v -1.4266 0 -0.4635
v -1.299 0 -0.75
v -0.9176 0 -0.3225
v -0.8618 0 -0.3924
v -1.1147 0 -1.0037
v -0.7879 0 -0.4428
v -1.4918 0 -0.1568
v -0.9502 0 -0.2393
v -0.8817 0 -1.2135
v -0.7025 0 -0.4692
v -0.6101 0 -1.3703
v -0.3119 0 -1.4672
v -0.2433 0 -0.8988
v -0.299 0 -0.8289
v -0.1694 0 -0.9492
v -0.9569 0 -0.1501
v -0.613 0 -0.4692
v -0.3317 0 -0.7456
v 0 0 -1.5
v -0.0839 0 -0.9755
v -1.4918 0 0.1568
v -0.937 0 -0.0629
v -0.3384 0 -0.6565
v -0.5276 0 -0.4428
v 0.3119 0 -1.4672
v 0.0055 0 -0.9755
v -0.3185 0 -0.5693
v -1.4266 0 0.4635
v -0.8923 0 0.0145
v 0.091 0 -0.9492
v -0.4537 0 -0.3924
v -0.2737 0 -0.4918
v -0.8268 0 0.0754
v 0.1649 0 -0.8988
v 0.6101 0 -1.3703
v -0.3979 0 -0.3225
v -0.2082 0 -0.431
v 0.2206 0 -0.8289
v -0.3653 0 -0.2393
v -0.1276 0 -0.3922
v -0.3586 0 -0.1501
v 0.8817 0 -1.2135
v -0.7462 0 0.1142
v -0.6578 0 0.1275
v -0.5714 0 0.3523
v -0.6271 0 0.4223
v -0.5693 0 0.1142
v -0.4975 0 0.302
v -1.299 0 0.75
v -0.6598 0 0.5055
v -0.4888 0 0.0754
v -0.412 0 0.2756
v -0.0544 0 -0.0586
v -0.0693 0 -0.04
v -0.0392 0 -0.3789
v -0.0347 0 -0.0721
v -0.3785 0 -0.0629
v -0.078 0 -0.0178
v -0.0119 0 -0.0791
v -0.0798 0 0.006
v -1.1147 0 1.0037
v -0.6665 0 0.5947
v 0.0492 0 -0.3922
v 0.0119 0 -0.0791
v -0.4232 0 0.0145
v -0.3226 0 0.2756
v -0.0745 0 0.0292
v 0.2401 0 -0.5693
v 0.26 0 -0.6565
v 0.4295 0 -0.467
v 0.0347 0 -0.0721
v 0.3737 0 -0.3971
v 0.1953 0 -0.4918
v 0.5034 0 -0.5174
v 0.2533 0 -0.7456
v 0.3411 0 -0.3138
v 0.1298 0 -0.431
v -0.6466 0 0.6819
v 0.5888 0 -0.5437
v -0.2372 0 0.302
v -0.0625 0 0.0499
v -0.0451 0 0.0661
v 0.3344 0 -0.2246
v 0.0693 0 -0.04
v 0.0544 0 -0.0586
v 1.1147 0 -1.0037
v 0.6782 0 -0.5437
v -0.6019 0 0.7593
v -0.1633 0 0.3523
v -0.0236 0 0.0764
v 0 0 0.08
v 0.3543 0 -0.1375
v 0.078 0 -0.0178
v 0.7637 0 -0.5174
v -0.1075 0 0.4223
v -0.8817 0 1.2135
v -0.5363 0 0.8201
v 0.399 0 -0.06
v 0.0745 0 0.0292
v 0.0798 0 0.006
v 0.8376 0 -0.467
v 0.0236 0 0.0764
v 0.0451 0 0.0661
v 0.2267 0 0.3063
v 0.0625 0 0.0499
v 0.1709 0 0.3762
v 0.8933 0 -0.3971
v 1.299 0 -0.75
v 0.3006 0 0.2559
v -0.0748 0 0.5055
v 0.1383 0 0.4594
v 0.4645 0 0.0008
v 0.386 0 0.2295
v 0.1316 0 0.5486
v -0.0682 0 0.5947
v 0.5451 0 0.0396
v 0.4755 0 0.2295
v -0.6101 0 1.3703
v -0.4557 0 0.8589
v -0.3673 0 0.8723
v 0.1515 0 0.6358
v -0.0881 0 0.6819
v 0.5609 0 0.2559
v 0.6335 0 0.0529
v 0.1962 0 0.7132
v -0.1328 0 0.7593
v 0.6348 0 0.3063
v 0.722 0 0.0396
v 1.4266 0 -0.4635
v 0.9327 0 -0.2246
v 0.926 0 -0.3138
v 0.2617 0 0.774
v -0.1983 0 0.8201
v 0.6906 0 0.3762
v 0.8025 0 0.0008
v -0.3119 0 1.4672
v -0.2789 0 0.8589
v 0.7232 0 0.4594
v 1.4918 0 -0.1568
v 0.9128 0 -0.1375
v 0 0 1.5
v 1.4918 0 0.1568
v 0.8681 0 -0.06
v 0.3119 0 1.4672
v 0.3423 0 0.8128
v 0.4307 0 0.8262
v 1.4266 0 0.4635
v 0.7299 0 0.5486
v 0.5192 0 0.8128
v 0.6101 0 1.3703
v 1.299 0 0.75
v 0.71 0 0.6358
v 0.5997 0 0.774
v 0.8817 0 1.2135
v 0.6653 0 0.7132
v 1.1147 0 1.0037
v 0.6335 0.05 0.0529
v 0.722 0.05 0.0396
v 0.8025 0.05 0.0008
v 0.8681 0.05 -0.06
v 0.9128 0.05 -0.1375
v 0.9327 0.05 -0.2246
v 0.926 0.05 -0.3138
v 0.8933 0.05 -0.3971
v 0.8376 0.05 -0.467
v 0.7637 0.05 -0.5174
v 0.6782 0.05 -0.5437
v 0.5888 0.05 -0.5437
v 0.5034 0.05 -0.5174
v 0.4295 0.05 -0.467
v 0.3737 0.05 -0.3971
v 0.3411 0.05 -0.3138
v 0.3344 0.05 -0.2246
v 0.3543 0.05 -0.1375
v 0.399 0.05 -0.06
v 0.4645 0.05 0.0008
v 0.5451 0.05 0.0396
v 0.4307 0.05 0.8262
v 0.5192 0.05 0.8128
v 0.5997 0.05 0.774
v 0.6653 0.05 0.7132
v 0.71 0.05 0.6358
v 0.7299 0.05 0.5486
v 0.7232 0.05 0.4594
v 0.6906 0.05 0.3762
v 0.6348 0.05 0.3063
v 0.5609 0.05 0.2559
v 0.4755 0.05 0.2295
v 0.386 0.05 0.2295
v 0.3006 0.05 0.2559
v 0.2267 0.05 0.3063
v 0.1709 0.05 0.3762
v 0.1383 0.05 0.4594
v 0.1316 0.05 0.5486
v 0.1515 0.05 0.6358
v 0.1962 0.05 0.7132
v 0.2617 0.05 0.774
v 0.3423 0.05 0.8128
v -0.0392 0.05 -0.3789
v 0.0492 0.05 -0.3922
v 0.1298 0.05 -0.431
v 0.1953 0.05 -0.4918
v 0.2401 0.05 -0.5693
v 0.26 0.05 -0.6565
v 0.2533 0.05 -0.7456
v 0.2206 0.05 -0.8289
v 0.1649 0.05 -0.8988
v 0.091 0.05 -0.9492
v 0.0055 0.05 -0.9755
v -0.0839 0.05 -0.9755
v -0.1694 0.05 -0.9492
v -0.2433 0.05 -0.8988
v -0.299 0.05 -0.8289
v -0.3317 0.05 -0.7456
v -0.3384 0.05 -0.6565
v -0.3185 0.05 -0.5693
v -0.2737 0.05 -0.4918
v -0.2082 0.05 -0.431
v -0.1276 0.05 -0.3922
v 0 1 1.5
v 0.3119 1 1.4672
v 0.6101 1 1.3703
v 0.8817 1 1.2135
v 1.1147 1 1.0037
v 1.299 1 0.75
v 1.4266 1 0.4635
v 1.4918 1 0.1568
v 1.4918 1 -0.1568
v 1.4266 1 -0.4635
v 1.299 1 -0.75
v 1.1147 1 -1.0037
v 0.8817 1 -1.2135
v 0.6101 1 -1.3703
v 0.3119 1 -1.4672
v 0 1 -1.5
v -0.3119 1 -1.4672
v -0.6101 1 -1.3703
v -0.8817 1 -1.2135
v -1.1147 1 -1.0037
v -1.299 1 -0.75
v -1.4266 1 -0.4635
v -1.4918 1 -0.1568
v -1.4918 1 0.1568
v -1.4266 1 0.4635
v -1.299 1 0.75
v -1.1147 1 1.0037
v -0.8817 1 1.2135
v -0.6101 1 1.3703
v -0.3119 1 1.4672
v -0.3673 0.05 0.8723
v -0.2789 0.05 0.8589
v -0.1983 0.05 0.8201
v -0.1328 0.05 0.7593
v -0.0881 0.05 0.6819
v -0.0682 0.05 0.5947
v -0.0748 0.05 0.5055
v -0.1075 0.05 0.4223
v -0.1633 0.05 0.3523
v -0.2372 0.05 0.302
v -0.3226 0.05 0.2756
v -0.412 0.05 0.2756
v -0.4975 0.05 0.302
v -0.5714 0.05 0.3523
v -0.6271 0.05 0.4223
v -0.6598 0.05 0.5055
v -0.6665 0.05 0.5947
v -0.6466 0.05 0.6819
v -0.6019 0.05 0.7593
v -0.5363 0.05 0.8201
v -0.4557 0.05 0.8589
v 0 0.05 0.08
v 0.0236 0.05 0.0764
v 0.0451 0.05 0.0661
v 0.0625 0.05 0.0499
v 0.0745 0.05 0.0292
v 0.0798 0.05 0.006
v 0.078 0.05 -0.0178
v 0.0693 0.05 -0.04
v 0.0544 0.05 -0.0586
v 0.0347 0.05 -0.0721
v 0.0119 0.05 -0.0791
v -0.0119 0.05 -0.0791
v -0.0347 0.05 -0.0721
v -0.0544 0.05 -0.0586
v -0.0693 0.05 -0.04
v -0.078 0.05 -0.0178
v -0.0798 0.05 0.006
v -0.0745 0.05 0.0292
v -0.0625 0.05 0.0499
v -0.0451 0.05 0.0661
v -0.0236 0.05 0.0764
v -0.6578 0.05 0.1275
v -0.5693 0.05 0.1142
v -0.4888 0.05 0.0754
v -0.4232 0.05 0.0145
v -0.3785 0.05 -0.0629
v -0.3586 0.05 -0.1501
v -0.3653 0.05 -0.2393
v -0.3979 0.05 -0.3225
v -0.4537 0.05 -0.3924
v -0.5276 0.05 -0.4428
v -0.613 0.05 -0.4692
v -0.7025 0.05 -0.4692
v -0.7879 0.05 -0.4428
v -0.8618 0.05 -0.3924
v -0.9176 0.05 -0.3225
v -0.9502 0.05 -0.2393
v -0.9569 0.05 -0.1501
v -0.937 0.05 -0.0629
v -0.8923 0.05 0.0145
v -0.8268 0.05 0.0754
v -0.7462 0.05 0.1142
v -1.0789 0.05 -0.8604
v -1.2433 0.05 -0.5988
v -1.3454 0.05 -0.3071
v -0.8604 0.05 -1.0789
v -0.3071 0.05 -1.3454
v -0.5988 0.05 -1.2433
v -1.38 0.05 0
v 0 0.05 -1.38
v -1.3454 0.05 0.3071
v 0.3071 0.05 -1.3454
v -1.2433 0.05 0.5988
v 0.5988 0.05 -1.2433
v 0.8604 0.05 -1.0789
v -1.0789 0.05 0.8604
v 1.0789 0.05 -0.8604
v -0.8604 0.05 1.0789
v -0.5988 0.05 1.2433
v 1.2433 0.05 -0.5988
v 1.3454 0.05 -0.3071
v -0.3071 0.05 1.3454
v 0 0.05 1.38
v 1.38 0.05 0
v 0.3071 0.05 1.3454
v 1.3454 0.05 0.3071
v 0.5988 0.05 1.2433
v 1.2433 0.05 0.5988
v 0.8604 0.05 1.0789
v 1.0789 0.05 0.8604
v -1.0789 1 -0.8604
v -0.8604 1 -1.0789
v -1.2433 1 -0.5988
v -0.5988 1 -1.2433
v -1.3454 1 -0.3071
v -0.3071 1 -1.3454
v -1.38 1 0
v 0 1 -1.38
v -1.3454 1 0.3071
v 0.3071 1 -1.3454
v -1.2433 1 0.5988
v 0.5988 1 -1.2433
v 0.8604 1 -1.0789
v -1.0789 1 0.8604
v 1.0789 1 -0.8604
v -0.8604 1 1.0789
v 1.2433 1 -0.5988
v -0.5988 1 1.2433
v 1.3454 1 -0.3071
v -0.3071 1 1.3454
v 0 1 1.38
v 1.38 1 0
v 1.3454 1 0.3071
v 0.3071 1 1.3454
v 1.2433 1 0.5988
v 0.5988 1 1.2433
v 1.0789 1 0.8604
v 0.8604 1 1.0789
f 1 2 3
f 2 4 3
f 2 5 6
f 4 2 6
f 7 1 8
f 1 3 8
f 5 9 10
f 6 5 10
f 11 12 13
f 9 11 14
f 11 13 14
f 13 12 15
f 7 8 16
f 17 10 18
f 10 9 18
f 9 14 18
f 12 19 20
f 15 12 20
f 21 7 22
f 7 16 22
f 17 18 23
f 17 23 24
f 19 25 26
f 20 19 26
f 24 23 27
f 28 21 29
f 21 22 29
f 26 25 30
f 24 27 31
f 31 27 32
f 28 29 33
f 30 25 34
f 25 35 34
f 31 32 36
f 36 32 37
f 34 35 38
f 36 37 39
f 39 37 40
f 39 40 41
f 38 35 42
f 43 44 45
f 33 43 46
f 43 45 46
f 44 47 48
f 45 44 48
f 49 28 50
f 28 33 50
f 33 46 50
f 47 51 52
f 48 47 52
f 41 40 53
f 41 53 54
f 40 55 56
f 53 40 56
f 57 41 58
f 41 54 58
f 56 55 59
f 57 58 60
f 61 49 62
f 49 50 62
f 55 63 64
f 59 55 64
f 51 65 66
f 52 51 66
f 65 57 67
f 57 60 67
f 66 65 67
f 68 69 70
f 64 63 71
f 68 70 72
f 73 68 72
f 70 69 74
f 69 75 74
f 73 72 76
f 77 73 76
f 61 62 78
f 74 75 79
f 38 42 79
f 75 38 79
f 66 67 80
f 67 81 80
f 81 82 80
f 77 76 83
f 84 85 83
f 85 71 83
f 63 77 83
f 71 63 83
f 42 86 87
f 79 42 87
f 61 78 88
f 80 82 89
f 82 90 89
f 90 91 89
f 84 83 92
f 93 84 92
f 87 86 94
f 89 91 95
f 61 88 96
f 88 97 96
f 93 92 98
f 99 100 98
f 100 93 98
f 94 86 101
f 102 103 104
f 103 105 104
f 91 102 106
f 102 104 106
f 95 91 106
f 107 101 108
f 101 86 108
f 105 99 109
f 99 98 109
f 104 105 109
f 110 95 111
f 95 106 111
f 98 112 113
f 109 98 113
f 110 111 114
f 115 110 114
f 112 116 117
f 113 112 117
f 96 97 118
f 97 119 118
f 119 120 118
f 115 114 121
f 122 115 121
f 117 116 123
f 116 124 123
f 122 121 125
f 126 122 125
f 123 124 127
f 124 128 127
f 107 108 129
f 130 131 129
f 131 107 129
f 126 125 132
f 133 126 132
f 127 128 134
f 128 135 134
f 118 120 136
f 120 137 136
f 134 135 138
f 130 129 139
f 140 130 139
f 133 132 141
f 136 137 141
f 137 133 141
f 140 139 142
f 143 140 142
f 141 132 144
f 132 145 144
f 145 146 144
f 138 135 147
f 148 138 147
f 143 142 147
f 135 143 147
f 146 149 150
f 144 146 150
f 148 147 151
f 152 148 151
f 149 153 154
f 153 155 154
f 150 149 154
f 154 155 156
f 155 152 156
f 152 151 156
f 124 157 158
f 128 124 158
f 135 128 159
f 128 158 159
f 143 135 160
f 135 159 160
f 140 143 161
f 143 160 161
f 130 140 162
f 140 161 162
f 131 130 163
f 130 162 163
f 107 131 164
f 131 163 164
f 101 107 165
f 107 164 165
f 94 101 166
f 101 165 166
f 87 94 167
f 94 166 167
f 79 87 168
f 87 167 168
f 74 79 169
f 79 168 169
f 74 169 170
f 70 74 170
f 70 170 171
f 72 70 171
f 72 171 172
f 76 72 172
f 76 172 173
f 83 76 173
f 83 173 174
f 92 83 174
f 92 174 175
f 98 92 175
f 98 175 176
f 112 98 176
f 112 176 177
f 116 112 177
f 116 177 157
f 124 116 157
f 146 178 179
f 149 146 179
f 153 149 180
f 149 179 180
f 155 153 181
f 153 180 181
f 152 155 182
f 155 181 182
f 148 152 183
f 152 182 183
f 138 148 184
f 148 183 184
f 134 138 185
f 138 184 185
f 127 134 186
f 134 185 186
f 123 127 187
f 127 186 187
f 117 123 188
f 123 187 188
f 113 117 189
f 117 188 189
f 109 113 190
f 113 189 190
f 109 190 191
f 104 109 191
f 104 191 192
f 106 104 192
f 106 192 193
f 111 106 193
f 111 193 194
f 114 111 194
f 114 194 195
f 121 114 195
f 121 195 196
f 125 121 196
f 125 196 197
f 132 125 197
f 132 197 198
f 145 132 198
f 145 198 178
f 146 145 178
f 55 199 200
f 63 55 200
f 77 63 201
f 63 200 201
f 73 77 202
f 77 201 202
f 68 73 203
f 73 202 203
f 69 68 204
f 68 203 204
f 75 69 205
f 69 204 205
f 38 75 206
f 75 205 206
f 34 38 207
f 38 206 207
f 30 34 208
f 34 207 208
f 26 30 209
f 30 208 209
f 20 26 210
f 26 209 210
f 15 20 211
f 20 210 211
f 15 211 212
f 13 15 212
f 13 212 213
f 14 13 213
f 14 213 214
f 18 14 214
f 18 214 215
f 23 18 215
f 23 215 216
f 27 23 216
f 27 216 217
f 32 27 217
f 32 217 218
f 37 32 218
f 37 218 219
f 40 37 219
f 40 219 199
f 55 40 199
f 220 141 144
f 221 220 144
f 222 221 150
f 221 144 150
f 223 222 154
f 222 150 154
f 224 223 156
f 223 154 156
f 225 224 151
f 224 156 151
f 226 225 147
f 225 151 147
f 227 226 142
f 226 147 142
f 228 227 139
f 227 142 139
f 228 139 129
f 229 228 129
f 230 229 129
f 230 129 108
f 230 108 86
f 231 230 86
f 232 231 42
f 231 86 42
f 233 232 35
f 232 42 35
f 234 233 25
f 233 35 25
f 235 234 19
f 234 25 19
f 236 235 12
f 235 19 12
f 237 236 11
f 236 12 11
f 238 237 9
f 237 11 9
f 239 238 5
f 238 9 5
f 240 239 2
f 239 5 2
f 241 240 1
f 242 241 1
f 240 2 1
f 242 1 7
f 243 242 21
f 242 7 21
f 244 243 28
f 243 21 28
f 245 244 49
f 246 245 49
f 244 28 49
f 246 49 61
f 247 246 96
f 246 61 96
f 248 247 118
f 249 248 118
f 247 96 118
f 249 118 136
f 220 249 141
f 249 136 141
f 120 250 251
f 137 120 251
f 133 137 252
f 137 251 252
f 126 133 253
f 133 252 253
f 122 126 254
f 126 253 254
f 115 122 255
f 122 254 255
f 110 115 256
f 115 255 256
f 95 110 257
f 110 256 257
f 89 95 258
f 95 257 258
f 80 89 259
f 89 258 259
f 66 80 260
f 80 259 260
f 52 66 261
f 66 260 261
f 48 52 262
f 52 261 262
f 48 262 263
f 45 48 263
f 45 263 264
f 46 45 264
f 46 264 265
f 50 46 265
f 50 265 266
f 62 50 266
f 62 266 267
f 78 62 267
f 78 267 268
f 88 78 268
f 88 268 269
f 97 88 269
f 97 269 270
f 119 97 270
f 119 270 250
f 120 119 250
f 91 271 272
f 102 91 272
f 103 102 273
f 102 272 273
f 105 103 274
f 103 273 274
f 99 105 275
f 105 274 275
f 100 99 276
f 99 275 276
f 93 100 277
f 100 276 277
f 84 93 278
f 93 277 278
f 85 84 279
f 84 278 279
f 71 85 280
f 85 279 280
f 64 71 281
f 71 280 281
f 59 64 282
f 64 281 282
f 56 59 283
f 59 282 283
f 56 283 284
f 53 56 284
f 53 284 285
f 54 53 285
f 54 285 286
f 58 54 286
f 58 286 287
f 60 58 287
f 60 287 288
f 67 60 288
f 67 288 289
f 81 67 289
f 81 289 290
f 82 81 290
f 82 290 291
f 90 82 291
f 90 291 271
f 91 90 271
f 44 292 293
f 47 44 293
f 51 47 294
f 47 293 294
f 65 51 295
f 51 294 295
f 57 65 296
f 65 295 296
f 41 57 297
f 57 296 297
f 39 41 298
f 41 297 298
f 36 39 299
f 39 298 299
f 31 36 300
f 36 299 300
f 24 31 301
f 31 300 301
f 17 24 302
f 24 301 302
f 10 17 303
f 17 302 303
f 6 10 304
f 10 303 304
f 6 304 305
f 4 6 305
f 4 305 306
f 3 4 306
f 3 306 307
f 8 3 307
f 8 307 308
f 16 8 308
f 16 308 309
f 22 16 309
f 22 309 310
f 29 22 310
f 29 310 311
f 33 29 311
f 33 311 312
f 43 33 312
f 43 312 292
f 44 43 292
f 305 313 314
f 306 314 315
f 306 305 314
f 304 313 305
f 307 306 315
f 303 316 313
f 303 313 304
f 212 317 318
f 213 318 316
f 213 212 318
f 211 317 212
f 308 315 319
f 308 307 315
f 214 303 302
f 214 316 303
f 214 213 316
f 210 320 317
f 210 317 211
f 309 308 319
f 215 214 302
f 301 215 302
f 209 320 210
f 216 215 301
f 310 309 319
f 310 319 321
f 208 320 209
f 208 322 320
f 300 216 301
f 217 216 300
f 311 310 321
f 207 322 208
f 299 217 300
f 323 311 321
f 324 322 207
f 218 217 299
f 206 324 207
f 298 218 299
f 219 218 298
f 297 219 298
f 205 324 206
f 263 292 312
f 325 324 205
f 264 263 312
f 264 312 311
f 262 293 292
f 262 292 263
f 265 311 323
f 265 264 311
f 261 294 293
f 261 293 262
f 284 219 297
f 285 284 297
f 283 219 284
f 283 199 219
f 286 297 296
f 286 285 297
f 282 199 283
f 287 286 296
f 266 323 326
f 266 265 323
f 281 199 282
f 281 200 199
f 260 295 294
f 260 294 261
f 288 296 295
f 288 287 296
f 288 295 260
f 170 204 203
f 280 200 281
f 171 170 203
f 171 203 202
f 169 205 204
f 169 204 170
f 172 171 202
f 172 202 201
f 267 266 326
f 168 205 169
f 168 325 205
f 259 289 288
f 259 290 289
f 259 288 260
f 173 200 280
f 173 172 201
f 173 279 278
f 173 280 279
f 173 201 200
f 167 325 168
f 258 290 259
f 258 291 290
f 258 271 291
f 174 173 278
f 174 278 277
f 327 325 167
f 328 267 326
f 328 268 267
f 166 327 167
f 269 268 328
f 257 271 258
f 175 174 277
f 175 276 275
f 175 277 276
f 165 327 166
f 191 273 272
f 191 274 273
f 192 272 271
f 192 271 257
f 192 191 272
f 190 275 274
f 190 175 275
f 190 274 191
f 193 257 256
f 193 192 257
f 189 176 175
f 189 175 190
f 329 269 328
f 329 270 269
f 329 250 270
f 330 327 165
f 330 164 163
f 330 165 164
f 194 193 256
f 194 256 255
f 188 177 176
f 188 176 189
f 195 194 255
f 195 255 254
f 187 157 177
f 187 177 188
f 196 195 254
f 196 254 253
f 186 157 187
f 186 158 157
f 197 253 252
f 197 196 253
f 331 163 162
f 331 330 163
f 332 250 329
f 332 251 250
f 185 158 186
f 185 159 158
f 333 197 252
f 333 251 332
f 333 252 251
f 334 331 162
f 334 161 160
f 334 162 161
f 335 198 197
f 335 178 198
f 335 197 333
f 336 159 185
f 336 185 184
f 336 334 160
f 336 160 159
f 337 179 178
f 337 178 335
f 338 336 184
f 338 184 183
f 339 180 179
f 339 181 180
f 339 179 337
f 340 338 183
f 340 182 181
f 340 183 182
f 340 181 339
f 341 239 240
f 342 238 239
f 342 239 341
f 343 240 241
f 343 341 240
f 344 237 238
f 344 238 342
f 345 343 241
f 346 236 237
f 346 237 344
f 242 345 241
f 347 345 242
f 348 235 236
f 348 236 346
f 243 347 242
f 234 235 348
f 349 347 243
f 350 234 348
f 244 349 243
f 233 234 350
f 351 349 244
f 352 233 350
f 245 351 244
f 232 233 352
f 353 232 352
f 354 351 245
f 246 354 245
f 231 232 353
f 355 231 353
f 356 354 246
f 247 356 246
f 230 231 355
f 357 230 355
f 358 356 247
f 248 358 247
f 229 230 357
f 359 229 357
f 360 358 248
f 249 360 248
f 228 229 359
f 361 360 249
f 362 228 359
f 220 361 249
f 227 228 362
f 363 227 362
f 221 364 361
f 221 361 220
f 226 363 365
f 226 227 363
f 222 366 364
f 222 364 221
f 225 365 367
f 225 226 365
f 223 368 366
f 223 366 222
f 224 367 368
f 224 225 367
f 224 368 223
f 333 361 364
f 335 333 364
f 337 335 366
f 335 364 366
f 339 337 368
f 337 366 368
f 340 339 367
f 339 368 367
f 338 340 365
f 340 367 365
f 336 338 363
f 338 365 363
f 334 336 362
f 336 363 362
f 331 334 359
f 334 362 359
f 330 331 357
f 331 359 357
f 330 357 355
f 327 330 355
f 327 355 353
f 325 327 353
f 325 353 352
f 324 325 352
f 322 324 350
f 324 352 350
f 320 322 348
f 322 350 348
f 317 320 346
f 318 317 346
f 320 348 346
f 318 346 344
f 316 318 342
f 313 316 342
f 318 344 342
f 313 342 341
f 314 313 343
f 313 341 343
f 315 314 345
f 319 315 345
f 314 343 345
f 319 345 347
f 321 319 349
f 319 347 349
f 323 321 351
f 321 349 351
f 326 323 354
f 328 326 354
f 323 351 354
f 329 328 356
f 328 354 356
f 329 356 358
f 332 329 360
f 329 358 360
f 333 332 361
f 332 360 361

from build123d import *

# Parameters (mm, degrees)
SKETCH1_R           = 150
BOSS_EXTRUDE1_DEPTH = 100
SKETCH3_R           = 138
CUT_EXTRUDE1_DEPTH  = 95
SKETCH4_R           = 30
CUT_EXTRUDE2_DEPTH  = 8
SKETCH5_R           = 8
CUT_EXTRUDE3_DEPTH  = 8
SCALE1_SCALE        = 0.01


with BuildPart() as part:
    # Sketch1 → Boss-Extrude1 (new body)
    with BuildSketch(Plane(origin=(0, 0, 0), x_dir=(1, 0, 0), z_dir=(0, 1, 0))):
        with Locations(Location((0, 0, 0), (0, 0, 270))):
            Circle(SKETCH1_R)
    extrude(amount=BOSS_EXTRUDE1_DEPTH)

    # Sketch3 → Cut-Extrude1 (cut)
    with BuildSketch(Plane(origin=(0, 100, 0), x_dir=(1, 0, 0), z_dir=(0, 1, 0))):
        with Locations(Location((0, 0, 0), (0, 0, 270))):
            Circle(SKETCH3_R)
    extrude(amount=-CUT_EXTRUDE1_DEPTH, mode=Mode.SUBTRACT)

    # Sketch4 → Cut-Extrude2 (cut)
    with BuildSketch(Plane(origin=(0, 5, 0), x_dir=(1, 0, 0), z_dir=(0, 1, 0))):
        with Locations(Location((-3.91997957, 67.886918918, 0), (0, 0, 270))):
            Circle(SKETCH4_R)
        with Locations(Location((63.352956303, 24.706333755, 0), (0, 0, 270))):
            Circle(SKETCH4_R)
        with Locations(Location((43.074259853, -52.61756492, 0), (0, 0, 270))):
            Circle(SKETCH4_R)
        with Locations(Location((-36.731599674, -57.225777281, 0), (0, 0, 270))):
            Circle(SKETCH4_R)
        with Locations(Location((-65.775636913, 17.250089528, 0), (0, 0, 270))):
            Circle(SKETCH4_R)
    extrude(amount=-CUT_EXTRUDE2_DEPTH, mode=Mode.SUBTRACT)

    # Sketch5 → Cut-Extrude3 (cut)
    with BuildSketch(Plane(origin=(0, 5, 0), x_dir=(1, 0, 0), z_dir=(0, 1, 0))):
        with Locations(Location((0, 0, 0), (0, 0, 270))):
            Circle(SKETCH5_R)
    extrude(amount=-CUT_EXTRUDE3_DEPTH, mode=Mode.SUBTRACT)


with BuildPart() as part_1:
    # Scale1: scaled about (0, 0, 0)
    add(part.part.scale(SCALE1_SCALE))


solid = part_1.part
